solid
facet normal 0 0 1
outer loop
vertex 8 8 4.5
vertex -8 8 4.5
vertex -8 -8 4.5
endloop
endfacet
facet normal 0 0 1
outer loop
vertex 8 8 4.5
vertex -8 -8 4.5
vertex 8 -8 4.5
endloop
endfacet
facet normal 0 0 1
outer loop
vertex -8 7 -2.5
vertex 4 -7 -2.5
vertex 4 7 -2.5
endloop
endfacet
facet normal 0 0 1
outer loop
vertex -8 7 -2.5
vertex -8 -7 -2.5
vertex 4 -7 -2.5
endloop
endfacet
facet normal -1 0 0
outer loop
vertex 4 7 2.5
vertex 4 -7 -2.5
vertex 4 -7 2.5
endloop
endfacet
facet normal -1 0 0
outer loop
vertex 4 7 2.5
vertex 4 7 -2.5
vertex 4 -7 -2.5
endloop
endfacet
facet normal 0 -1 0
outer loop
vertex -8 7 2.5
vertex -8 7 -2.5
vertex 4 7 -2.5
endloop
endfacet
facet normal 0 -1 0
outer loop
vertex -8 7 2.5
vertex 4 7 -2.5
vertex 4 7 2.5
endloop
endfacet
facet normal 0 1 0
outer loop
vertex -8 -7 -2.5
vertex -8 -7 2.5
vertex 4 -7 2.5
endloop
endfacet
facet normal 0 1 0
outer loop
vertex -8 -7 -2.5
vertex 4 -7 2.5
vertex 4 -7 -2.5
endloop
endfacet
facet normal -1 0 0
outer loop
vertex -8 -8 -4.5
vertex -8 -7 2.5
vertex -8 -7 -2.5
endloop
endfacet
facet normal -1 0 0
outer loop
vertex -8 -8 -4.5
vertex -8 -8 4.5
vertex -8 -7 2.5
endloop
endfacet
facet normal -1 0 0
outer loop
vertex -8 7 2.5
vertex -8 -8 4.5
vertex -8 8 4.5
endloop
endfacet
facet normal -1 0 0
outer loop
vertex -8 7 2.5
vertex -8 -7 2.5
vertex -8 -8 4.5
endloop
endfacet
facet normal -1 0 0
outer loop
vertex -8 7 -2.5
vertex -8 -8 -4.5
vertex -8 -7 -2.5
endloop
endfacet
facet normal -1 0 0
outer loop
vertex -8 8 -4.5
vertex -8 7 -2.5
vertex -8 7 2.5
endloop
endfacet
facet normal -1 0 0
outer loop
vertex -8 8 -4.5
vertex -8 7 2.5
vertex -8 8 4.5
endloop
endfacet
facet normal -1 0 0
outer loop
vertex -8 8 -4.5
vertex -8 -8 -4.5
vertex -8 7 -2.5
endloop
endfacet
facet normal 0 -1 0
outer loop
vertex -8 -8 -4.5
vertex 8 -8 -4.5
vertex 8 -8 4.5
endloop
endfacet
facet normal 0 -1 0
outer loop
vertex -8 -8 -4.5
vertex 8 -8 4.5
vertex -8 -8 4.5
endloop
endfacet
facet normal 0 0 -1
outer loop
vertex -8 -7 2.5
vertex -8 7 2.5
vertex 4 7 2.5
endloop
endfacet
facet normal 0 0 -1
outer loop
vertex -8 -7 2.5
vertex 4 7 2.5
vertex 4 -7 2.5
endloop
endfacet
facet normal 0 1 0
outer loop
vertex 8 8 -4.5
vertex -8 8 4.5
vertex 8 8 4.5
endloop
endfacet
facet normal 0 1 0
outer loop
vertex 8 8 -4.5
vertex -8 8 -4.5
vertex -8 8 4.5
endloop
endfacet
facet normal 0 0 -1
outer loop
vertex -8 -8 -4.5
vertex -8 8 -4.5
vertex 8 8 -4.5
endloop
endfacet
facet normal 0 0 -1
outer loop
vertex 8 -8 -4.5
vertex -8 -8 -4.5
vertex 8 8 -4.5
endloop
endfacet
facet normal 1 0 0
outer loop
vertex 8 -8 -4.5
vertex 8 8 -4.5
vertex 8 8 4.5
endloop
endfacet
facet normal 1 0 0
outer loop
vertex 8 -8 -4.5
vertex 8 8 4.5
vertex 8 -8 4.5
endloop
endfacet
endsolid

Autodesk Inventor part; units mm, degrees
ref_plane "YZ Plane" through (0, 0, 0) normal (1, 0, 0) x (0, 1, 0)
ref_plane "XZ Plane" through (0, 0, 0) normal (0, 1, 0) x (-1, 0, 0)
ref_plane "XY Plane" through (0, 0, 0) normal (0, 0, 1) x (1, 0, 0)
sketch "Sketch1" plane through (0, 0, 0) normal (0, 0, 1) x (1, 0, 0)
  line L0 (0, 11.2) -> (0, -11.2) projected
  line L1 (-11.2, 0) -> (11.2, 0) projected
  line L2 (-8, 8) -> (8, 8)
  line L3 (8, 8) -> (8, -8)
  line L4 (8, -8) -> (-8, -8)
  line L5 (-8, -8) -> (-8, 8)
  dimension "d0" = 16
  dimension "d1" = 16
extrude "BLOK" add sketch "Sketch1" along normal mid plane 9
sketch "Sketch3" plane through (-8, -8, 4.5) normal (-1, 0, 0) x (0, 0, 1)
  line L0 (0, 0) -> (-9, 0) projected
  line L1 (-9, 16) -> (0, 16) projected
  line L2 (-9, 0) -> (-9, 16) projected
  line L3 (-7, 15) -> (-2, 15)
  line L4 (-2, 15) -> (-2, 1)
  line L5 (-2, 1) -> (-7, 1)
  line L6 (-7, 1) -> (-7, 15)
  point P0 (-4.5, 8)
  dimension "d21" = 2
  dimension "d22" = 1
  dimension "d23" = 1
  dimension "d24" = 5
extrude "USBGAT" cut sketch "Sketch3" against normal blind 12
properties part number "USB_Cap"
